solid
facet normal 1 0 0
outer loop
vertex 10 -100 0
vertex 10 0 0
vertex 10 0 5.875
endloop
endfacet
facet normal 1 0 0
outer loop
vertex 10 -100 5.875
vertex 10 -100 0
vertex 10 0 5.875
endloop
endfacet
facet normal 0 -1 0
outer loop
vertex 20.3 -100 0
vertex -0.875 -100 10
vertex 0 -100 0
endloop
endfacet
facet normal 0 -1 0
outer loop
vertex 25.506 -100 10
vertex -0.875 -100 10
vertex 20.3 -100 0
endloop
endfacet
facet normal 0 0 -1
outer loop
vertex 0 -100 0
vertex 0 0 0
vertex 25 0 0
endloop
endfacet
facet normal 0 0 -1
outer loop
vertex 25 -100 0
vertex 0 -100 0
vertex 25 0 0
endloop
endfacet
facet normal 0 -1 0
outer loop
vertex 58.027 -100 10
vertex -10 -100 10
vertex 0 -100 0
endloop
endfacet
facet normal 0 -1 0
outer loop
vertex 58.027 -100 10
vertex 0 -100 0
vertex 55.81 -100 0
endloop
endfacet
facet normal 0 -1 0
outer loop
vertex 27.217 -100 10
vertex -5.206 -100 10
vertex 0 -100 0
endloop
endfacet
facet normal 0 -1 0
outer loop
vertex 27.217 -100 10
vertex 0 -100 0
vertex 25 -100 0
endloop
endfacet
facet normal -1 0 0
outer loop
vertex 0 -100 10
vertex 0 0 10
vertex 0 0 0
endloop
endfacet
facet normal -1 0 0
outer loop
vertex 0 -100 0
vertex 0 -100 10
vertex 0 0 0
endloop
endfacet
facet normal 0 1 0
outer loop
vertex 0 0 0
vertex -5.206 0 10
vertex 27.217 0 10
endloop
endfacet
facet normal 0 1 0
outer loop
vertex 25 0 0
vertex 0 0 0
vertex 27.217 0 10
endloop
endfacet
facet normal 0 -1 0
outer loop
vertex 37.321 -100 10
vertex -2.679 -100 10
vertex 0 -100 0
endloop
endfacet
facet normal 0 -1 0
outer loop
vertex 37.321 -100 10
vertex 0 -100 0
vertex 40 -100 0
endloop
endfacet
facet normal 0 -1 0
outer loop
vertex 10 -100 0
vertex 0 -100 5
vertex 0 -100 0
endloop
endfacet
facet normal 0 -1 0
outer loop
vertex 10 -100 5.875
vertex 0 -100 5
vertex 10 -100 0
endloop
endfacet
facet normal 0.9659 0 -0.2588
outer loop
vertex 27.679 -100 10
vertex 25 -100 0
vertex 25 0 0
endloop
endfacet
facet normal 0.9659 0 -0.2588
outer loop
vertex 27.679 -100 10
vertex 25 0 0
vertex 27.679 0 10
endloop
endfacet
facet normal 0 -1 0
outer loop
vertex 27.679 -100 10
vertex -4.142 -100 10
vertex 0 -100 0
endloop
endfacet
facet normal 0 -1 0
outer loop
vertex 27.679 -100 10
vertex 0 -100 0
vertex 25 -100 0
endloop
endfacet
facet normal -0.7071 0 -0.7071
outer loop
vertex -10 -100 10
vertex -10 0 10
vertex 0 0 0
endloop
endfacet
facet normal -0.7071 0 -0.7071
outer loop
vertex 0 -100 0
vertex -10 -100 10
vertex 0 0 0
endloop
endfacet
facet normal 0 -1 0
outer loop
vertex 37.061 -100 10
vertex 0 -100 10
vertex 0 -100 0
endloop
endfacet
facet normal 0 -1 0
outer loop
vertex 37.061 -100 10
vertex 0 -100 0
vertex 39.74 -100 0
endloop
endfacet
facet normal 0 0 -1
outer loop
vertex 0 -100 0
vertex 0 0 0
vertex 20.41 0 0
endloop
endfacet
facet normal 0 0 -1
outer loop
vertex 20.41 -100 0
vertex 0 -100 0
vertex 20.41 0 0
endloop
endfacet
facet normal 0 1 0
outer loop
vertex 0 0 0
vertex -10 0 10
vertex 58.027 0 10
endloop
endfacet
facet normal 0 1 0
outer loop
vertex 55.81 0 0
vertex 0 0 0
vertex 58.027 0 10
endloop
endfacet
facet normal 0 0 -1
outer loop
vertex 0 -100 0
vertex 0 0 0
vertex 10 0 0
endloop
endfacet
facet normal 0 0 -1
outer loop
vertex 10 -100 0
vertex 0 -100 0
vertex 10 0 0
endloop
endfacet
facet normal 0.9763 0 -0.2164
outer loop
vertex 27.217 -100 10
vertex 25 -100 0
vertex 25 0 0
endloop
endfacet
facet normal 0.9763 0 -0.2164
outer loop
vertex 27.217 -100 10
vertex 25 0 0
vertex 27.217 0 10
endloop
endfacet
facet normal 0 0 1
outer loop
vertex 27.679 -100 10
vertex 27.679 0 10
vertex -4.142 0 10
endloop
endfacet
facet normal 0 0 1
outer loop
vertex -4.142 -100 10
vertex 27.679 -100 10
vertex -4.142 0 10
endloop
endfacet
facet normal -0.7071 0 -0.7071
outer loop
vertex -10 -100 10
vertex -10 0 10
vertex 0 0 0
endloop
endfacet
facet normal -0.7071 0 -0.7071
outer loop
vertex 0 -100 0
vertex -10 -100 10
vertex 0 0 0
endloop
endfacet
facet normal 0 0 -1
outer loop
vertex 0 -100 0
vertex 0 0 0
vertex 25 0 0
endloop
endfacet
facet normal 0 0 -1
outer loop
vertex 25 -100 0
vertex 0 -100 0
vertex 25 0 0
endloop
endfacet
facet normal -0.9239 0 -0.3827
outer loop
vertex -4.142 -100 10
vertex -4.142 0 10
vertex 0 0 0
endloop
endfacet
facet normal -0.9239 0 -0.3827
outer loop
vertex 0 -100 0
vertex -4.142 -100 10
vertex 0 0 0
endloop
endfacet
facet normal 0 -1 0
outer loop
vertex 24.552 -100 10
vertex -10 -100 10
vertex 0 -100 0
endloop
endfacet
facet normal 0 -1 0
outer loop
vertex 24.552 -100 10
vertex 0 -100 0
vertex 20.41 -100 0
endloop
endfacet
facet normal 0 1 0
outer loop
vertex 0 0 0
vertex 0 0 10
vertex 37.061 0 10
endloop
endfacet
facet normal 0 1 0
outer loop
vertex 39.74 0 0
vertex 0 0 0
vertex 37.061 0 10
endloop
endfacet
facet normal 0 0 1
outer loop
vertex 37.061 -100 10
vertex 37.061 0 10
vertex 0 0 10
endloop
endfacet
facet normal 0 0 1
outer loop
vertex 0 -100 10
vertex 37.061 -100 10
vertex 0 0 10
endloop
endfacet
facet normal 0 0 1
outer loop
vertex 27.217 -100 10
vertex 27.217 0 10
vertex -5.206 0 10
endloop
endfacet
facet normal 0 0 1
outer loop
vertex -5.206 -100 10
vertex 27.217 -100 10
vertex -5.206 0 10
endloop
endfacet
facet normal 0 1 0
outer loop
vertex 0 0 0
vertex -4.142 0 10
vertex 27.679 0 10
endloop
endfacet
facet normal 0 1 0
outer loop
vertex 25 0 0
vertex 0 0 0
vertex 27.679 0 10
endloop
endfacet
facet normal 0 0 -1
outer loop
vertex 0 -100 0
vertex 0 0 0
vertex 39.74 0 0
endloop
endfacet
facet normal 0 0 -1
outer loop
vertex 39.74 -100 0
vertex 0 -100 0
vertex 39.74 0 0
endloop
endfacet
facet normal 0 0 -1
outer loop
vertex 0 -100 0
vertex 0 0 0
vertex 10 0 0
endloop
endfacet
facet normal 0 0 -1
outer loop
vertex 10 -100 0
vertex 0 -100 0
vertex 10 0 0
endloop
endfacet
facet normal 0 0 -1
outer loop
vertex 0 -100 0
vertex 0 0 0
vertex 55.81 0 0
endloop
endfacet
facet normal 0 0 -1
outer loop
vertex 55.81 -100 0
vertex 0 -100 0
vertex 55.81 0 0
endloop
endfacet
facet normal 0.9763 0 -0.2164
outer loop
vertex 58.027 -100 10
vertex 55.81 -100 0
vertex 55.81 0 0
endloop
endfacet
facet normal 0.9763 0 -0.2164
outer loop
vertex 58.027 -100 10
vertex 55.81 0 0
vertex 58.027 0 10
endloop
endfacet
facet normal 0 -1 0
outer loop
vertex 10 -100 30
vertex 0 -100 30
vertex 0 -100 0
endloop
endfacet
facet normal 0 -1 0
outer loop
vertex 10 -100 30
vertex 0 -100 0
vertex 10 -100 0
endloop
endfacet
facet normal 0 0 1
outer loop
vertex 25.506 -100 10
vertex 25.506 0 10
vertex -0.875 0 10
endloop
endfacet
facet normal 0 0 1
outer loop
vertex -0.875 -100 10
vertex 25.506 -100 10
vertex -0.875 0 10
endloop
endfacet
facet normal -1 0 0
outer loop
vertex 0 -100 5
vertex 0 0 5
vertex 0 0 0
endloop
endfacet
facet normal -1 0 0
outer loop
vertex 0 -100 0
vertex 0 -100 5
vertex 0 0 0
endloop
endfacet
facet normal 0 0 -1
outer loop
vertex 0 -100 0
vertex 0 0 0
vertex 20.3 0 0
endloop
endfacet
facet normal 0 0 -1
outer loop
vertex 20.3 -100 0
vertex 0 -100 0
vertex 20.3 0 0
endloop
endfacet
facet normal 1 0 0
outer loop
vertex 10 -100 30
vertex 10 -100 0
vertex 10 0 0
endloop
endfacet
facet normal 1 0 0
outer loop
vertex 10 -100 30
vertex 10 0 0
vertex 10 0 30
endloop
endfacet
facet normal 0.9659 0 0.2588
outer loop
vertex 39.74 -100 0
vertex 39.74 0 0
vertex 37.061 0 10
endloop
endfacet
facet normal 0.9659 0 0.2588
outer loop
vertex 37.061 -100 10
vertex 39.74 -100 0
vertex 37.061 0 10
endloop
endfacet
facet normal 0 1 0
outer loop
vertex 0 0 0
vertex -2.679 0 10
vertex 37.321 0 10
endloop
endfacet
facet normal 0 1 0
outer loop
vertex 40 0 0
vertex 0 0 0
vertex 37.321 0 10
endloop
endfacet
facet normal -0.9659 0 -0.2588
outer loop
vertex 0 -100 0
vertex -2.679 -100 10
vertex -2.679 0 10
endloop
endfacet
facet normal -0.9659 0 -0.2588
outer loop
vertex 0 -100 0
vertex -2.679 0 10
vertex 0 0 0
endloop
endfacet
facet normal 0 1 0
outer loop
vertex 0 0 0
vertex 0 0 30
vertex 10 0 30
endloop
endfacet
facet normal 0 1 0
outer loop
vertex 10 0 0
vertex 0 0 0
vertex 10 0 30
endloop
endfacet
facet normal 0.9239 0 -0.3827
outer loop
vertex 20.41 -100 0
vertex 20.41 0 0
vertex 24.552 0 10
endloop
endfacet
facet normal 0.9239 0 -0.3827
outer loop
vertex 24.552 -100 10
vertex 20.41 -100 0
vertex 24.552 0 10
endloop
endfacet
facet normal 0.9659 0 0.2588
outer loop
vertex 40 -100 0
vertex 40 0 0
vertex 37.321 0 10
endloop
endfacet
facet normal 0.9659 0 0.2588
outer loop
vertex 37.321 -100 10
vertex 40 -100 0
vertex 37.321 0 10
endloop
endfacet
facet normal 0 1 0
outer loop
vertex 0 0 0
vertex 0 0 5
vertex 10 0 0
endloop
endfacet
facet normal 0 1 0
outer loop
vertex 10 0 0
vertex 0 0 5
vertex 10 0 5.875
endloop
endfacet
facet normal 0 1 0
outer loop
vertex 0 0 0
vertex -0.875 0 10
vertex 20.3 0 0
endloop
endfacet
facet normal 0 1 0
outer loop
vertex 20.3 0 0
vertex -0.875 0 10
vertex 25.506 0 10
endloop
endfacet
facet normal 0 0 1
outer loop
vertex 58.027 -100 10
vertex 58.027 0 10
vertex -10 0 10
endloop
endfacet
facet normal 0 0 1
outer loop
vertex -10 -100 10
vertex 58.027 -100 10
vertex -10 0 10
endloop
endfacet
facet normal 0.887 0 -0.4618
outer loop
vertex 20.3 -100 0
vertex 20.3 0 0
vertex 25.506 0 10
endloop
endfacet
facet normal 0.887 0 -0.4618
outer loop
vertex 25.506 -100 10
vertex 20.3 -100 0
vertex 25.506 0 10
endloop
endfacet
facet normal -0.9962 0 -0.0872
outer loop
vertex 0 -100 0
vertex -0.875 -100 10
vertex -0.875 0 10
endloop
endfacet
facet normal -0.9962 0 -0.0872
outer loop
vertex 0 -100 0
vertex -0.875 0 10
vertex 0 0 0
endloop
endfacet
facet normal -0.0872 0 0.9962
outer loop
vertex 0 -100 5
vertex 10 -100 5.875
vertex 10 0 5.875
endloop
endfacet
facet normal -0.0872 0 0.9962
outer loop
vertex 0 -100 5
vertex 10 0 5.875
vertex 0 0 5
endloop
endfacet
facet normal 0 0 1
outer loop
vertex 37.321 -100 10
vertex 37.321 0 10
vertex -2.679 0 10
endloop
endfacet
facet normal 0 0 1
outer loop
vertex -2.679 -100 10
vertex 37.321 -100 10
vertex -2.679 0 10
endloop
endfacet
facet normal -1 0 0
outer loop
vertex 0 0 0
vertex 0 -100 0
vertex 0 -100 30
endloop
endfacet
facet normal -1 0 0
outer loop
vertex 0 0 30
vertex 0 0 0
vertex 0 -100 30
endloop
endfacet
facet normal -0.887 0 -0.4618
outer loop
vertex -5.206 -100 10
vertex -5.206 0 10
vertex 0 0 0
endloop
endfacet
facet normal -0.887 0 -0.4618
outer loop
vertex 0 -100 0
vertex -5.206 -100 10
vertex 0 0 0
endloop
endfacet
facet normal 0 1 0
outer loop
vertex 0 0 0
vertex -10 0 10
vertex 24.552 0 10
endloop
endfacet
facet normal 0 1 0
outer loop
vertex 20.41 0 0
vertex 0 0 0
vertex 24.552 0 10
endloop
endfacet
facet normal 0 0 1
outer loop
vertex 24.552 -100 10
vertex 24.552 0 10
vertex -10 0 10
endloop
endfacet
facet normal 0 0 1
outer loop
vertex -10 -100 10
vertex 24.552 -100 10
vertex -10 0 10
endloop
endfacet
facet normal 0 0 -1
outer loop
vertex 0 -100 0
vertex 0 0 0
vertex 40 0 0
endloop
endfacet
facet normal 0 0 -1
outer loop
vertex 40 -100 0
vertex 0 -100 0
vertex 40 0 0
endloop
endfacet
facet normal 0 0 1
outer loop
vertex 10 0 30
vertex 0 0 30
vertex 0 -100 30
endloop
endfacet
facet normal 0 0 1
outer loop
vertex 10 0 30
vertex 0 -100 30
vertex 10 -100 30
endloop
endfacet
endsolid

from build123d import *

# Parameters (mm, degrees)
F0_W      = 10
F0_H      = 30
F1_DEPTH  = 100
F3_DEPTH  = 100
F5_DEPTH  = 100
F7_DEPTH  = 100
F9_DEPTH  = 100
F11_DEPTH = 100
F13_DEPTH = 100
F15_DEPTH = 100
F17_DEPTH = 100


with BuildPart() as f1:
    # F0 (on Front) → F1 (new body)
    with BuildSketch(Plane.XZ):
        with Locations((5, 15)):
            Rectangle(F0_W, F0_H)
    extrude(amount=F1_DEPTH)


with BuildPart() as f3:
    # F2 (on Front) → F3 (new body)
    with BuildSketch(Plane.XZ):
        Polygon((0, 10), (0, 0), (39.74, 0), (37.060508, 10), align=None)
    extrude(amount=F3_DEPTH)


with BuildPart() as f5:
    # F4 (on Front) → F5 (new body)
    with BuildSketch(Plane.XZ):
        Polygon((-4.142136, 10), (0, 0), (25, 0), (27.679492, 10), align=None)
    extrude(amount=F5_DEPTH)


with BuildPart() as f7:
    # F6 (on Front) → F7 (new body)
    with BuildSketch(Plane.XZ):
        Polygon((-2.679492, 10), (0, 0), (40, 0), (37.320508, 10), align=None)
    extrude(amount=F7_DEPTH)


with BuildPart() as f9:
    # F8 (on Front) → F9 (new body)
    with BuildSketch(Plane.XZ):
        Polygon((-10, 10), (0, 0), (20.41, 0), (24.552136, 10), align=None)
    extrude(amount=F9_DEPTH)


with BuildPart() as f11:
    # F10 (on Front) → F11 (new body)
    with BuildSketch(Plane.XZ):
        Polygon((-10, 10), (0, 0), (55.81, 0), (58.026947, 10), align=None)
    extrude(amount=F11_DEPTH)


with BuildPart() as f13:
    # F12 (on Front) → F13 (new body)
    with BuildSketch(Plane.XZ):
        Polygon((-5.205671, 10), (0, 0), (25, 0), (27.216947, 10), align=None)
    extrude(amount=F13_DEPTH)


with BuildPart() as f15:
    # F14 (on Front) → F15 (new body)
    with BuildSketch(Plane.XZ):
        Polygon((-0.874887, 10), (0, 0), (20.3, 0), (25.505671, 10), align=None)
    extrude(amount=F15_DEPTH)


with BuildPart() as f17:
    # F16 (on Front) → F17 (new body)
    with BuildSketch(Plane.XZ):
        Polygon((0, 5), (0, 0), (10, 0), (10, 5.874887), align=None)
    extrude(amount=F17_DEPTH)


solid = Compound([f1.part, f3.part, f5.part, f7.part, f9.part, f11.part, f13.part, f15.part, f17.part])
